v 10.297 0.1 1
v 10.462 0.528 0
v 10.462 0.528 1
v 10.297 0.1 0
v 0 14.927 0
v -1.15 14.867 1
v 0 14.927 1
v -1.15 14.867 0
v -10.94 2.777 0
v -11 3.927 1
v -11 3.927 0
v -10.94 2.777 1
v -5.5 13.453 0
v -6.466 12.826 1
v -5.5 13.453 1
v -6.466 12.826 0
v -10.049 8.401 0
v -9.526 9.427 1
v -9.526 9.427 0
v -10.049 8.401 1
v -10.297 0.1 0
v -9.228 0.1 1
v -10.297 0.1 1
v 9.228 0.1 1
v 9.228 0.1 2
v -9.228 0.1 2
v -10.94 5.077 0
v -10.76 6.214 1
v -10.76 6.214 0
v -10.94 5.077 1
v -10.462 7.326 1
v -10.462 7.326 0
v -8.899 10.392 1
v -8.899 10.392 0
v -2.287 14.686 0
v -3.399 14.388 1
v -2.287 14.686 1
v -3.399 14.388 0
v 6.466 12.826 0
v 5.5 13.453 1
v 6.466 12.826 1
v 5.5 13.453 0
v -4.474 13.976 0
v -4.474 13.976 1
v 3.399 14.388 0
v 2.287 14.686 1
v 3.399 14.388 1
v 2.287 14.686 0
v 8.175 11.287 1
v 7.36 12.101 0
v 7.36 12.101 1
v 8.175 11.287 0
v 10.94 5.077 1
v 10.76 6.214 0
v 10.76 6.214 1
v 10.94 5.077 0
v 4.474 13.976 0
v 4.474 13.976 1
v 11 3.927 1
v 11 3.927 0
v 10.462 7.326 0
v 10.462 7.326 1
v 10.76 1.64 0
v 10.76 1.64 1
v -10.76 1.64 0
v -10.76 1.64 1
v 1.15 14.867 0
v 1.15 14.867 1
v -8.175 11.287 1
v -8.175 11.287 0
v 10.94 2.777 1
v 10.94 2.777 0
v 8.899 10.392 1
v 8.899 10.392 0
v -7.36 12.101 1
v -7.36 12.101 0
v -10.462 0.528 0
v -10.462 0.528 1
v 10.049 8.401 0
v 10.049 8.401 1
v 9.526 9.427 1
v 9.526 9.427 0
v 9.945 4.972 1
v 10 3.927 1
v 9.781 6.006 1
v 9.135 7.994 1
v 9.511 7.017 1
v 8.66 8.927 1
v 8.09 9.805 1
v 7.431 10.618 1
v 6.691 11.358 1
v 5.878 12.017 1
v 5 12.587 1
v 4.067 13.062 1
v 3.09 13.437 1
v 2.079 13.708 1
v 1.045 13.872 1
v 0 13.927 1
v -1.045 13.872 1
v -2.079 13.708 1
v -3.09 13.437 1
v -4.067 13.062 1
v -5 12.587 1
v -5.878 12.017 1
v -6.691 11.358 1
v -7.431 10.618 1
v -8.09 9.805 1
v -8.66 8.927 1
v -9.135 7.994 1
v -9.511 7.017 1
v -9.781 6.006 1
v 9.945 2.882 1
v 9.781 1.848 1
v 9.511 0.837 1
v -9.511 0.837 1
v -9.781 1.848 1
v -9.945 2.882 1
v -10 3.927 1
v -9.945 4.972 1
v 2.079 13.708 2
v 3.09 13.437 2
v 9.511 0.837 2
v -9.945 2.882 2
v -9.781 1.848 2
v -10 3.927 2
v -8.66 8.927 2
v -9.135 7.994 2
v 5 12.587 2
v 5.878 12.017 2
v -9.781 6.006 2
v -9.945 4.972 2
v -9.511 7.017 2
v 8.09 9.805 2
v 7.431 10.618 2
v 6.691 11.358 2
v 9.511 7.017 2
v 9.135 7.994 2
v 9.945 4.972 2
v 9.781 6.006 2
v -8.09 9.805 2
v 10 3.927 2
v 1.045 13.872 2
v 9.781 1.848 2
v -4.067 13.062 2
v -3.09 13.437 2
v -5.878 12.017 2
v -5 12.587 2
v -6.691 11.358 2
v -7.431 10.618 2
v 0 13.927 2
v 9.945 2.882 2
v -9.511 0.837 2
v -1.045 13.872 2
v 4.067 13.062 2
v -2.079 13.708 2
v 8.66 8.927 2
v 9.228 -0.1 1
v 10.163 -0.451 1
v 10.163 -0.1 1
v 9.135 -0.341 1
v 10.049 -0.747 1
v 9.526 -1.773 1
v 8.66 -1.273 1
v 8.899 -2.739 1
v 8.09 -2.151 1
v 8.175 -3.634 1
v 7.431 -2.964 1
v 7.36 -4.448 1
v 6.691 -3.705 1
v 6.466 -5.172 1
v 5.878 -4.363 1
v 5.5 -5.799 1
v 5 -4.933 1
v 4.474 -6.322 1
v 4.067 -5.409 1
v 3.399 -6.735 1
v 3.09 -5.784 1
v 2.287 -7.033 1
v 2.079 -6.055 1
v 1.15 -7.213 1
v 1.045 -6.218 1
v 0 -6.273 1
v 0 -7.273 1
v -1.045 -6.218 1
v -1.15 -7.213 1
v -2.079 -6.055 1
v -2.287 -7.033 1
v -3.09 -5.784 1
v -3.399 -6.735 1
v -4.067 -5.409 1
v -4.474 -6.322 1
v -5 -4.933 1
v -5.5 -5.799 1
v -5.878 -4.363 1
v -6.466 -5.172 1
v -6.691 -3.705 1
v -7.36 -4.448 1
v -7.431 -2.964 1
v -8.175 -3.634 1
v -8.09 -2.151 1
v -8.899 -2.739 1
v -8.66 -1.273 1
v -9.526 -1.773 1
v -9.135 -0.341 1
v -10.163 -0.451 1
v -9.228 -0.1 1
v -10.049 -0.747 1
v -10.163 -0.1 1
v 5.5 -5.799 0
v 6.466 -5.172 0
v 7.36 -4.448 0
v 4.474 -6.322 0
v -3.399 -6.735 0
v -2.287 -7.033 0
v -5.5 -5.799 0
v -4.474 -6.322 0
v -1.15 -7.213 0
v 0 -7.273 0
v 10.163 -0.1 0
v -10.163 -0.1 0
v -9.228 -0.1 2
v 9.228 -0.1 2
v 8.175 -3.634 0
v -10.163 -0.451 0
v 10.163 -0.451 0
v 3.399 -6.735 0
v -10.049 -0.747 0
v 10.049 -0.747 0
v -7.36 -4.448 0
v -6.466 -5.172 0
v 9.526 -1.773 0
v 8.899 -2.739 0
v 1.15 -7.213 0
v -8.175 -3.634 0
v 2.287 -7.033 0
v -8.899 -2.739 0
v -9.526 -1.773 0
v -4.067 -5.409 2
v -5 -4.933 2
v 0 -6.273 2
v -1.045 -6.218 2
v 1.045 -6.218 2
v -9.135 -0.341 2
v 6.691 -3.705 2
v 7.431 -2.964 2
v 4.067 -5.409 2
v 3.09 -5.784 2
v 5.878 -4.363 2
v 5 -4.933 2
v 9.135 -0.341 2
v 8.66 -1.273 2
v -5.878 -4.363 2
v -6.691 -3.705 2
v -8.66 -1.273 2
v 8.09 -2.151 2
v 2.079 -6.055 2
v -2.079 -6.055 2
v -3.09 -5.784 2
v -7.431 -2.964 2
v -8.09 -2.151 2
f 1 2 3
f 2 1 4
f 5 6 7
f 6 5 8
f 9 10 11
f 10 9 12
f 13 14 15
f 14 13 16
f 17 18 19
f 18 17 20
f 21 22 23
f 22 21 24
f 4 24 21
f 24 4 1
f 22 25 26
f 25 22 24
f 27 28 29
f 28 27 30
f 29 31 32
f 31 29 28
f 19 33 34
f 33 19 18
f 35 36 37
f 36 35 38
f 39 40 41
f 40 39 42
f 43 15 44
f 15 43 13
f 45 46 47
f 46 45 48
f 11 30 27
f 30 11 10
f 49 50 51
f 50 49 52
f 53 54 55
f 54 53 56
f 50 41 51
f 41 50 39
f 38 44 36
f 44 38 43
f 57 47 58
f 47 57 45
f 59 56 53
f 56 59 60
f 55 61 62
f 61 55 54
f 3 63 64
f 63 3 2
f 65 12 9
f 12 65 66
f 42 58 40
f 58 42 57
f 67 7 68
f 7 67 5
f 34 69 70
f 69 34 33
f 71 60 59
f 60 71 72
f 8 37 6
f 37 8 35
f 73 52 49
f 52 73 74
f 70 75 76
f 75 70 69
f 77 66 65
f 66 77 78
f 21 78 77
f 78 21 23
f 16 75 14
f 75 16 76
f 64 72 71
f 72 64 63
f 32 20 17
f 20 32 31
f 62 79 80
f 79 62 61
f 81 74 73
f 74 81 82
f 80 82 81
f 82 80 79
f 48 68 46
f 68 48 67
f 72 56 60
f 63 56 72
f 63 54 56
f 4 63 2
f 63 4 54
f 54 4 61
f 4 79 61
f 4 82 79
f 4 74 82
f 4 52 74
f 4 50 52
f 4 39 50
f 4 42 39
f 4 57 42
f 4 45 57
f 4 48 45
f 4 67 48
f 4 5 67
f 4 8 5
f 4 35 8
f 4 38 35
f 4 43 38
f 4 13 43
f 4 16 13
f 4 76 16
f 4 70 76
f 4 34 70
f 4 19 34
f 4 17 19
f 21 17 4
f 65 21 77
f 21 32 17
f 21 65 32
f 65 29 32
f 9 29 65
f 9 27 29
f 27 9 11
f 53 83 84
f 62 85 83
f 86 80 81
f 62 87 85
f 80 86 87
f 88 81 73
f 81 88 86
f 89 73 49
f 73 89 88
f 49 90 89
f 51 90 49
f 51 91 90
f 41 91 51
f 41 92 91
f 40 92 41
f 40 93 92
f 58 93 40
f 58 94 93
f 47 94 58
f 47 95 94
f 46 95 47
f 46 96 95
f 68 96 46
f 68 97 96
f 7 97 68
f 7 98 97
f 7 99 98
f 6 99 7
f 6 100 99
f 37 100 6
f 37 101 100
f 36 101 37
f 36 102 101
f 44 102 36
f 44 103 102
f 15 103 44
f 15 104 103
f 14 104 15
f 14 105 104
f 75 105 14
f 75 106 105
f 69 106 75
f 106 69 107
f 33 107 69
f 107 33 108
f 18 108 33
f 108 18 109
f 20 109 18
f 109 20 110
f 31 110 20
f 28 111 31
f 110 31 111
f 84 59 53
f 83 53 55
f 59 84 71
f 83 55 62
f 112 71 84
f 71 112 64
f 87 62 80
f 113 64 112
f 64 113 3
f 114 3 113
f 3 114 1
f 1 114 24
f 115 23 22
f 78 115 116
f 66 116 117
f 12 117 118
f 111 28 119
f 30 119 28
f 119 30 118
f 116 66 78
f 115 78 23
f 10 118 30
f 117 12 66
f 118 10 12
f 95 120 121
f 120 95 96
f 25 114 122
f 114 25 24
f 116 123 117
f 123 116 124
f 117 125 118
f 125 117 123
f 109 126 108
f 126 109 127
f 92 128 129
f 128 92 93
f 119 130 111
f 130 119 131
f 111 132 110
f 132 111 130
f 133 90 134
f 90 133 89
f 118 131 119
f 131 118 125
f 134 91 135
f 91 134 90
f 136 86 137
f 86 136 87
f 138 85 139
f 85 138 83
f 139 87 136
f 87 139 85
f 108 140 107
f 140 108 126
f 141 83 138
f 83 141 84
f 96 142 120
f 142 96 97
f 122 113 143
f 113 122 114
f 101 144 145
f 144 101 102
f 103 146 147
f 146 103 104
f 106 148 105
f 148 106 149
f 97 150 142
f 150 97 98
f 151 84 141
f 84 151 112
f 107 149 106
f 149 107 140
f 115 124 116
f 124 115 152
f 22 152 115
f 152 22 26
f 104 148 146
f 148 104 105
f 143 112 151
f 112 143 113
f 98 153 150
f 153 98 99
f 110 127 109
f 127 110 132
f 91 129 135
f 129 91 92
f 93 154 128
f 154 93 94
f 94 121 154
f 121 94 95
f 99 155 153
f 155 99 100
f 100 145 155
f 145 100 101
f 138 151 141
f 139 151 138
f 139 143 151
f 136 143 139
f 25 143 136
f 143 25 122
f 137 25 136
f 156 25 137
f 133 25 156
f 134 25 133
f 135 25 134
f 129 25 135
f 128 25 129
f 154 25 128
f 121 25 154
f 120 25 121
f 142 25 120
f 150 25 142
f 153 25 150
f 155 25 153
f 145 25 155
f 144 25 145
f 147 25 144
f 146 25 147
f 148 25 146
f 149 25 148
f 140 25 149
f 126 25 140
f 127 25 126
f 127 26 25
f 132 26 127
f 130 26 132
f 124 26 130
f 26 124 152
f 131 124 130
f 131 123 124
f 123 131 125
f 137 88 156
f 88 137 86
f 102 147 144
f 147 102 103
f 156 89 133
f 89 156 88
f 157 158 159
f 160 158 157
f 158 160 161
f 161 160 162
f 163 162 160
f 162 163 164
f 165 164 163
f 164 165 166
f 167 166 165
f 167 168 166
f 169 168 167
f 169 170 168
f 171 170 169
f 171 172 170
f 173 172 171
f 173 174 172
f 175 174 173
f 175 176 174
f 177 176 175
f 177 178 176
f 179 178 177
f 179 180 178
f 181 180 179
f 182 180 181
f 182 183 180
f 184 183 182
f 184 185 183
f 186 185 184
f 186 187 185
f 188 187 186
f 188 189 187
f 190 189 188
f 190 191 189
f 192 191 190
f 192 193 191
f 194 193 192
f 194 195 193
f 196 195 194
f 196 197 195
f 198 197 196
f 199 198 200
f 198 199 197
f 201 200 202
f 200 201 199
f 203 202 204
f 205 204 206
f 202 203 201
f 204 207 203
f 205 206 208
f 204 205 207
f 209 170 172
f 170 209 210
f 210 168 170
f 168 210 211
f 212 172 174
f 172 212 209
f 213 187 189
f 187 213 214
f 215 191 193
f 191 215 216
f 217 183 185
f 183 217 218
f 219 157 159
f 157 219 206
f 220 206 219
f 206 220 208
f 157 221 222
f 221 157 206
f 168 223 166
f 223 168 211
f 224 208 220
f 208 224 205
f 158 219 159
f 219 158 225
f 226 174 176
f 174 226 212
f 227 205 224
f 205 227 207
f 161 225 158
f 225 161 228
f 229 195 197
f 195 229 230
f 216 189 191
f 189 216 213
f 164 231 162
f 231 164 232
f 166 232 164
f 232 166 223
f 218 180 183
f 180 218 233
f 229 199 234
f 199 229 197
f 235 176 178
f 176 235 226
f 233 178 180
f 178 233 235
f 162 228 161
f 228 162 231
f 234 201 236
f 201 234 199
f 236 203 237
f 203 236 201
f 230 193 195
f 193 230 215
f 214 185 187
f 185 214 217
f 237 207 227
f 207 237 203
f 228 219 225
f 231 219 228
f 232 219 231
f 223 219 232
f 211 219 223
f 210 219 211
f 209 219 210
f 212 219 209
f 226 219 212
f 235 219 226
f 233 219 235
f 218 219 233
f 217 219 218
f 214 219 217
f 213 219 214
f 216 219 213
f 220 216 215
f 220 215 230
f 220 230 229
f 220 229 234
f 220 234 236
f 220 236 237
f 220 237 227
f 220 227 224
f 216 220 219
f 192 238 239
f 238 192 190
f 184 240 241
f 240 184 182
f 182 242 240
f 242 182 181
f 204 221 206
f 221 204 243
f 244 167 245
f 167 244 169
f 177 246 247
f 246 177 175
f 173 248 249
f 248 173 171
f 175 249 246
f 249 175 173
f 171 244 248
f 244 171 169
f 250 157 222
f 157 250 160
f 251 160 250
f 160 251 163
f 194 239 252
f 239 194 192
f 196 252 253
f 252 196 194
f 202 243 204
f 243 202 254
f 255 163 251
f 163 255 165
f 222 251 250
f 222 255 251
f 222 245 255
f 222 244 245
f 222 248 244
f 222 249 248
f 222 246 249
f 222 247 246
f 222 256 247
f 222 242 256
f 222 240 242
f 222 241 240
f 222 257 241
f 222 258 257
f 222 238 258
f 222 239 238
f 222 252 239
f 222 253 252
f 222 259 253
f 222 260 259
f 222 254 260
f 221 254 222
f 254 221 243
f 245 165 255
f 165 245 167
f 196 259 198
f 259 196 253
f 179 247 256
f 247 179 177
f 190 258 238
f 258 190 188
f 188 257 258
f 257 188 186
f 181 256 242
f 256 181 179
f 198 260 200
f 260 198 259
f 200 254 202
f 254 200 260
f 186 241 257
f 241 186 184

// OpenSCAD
// Unit of length: Unit.MM
$fn = 60;
$vpr = [0.0, 0.0, 0.0];

union()
{
   translate(v = [0.0, 0.1])
   {
      union()
      {
         color(c = [1.0, 0.0, 0.0, 1.0])
         {
            linear_extrude(height = 1.0, center = false, twist = 0.0, scale = 1.0)
            {
               translate(v = [0.0, 3.8268])
               {
                  intersection()
                  {
                     circle(d = 22.0);
                     polygon(points = [[-11.0, -3.8268], [-11.0, 11.0], [11.0, 11.0], [11.0, -3.8268]]);
                  }
               }
            }
         }
         translate(v = [0.0, 0.0, 0.0])
         {
            linear_extrude(height = 2.0, center = false, twist = 0.0, scale = 1.0)
            {
               translate(v = [0.0, 3.8268])
               {
                  intersection()
                  {
                     circle(d = 20.0);
                     polygon(points = [[-10.0, -3.8268], [-10.0, 10.0], [10.0, 10.0], [10.0, -3.8268]]);
                  }
               }
            }
         }
      }
   }
   translate(v = [0.0, -0.1])
   {
      union()
      {
         color(c = [1.0, 0.0, 0.0, 1.0])
         {
            linear_extrude(height = 1.0, center = false, twist = 0.0, scale = 1.0)
            {
               translate(v = [0.0, 3.8268])
               {
                  intersection()
                  {
                     circle(d = 22.0);
                     polygon(points = [[-10.1627, -11.0], [-10.1627, -3.8268], [10.1627, -3.8268], [10.1627, -11.0]]);
                  }
               }
            }
         }
         translate(v = [0.0, 0.0, 0.0])
         {
            linear_extrude(height = 2.0, center = false, twist = 0.0, scale = 1.0)
            {
               translate(v = [0.0, 3.8268])
               {
                  intersection()
                  {
                     circle(d = 20.0);
                     polygon(points = [[-9.2388, -10.0], [-9.2388, -3.8268], [9.2388, -3.8268], [9.2388, -10.0]]);
                  }
               }
            }
         }
      }
   }
}
